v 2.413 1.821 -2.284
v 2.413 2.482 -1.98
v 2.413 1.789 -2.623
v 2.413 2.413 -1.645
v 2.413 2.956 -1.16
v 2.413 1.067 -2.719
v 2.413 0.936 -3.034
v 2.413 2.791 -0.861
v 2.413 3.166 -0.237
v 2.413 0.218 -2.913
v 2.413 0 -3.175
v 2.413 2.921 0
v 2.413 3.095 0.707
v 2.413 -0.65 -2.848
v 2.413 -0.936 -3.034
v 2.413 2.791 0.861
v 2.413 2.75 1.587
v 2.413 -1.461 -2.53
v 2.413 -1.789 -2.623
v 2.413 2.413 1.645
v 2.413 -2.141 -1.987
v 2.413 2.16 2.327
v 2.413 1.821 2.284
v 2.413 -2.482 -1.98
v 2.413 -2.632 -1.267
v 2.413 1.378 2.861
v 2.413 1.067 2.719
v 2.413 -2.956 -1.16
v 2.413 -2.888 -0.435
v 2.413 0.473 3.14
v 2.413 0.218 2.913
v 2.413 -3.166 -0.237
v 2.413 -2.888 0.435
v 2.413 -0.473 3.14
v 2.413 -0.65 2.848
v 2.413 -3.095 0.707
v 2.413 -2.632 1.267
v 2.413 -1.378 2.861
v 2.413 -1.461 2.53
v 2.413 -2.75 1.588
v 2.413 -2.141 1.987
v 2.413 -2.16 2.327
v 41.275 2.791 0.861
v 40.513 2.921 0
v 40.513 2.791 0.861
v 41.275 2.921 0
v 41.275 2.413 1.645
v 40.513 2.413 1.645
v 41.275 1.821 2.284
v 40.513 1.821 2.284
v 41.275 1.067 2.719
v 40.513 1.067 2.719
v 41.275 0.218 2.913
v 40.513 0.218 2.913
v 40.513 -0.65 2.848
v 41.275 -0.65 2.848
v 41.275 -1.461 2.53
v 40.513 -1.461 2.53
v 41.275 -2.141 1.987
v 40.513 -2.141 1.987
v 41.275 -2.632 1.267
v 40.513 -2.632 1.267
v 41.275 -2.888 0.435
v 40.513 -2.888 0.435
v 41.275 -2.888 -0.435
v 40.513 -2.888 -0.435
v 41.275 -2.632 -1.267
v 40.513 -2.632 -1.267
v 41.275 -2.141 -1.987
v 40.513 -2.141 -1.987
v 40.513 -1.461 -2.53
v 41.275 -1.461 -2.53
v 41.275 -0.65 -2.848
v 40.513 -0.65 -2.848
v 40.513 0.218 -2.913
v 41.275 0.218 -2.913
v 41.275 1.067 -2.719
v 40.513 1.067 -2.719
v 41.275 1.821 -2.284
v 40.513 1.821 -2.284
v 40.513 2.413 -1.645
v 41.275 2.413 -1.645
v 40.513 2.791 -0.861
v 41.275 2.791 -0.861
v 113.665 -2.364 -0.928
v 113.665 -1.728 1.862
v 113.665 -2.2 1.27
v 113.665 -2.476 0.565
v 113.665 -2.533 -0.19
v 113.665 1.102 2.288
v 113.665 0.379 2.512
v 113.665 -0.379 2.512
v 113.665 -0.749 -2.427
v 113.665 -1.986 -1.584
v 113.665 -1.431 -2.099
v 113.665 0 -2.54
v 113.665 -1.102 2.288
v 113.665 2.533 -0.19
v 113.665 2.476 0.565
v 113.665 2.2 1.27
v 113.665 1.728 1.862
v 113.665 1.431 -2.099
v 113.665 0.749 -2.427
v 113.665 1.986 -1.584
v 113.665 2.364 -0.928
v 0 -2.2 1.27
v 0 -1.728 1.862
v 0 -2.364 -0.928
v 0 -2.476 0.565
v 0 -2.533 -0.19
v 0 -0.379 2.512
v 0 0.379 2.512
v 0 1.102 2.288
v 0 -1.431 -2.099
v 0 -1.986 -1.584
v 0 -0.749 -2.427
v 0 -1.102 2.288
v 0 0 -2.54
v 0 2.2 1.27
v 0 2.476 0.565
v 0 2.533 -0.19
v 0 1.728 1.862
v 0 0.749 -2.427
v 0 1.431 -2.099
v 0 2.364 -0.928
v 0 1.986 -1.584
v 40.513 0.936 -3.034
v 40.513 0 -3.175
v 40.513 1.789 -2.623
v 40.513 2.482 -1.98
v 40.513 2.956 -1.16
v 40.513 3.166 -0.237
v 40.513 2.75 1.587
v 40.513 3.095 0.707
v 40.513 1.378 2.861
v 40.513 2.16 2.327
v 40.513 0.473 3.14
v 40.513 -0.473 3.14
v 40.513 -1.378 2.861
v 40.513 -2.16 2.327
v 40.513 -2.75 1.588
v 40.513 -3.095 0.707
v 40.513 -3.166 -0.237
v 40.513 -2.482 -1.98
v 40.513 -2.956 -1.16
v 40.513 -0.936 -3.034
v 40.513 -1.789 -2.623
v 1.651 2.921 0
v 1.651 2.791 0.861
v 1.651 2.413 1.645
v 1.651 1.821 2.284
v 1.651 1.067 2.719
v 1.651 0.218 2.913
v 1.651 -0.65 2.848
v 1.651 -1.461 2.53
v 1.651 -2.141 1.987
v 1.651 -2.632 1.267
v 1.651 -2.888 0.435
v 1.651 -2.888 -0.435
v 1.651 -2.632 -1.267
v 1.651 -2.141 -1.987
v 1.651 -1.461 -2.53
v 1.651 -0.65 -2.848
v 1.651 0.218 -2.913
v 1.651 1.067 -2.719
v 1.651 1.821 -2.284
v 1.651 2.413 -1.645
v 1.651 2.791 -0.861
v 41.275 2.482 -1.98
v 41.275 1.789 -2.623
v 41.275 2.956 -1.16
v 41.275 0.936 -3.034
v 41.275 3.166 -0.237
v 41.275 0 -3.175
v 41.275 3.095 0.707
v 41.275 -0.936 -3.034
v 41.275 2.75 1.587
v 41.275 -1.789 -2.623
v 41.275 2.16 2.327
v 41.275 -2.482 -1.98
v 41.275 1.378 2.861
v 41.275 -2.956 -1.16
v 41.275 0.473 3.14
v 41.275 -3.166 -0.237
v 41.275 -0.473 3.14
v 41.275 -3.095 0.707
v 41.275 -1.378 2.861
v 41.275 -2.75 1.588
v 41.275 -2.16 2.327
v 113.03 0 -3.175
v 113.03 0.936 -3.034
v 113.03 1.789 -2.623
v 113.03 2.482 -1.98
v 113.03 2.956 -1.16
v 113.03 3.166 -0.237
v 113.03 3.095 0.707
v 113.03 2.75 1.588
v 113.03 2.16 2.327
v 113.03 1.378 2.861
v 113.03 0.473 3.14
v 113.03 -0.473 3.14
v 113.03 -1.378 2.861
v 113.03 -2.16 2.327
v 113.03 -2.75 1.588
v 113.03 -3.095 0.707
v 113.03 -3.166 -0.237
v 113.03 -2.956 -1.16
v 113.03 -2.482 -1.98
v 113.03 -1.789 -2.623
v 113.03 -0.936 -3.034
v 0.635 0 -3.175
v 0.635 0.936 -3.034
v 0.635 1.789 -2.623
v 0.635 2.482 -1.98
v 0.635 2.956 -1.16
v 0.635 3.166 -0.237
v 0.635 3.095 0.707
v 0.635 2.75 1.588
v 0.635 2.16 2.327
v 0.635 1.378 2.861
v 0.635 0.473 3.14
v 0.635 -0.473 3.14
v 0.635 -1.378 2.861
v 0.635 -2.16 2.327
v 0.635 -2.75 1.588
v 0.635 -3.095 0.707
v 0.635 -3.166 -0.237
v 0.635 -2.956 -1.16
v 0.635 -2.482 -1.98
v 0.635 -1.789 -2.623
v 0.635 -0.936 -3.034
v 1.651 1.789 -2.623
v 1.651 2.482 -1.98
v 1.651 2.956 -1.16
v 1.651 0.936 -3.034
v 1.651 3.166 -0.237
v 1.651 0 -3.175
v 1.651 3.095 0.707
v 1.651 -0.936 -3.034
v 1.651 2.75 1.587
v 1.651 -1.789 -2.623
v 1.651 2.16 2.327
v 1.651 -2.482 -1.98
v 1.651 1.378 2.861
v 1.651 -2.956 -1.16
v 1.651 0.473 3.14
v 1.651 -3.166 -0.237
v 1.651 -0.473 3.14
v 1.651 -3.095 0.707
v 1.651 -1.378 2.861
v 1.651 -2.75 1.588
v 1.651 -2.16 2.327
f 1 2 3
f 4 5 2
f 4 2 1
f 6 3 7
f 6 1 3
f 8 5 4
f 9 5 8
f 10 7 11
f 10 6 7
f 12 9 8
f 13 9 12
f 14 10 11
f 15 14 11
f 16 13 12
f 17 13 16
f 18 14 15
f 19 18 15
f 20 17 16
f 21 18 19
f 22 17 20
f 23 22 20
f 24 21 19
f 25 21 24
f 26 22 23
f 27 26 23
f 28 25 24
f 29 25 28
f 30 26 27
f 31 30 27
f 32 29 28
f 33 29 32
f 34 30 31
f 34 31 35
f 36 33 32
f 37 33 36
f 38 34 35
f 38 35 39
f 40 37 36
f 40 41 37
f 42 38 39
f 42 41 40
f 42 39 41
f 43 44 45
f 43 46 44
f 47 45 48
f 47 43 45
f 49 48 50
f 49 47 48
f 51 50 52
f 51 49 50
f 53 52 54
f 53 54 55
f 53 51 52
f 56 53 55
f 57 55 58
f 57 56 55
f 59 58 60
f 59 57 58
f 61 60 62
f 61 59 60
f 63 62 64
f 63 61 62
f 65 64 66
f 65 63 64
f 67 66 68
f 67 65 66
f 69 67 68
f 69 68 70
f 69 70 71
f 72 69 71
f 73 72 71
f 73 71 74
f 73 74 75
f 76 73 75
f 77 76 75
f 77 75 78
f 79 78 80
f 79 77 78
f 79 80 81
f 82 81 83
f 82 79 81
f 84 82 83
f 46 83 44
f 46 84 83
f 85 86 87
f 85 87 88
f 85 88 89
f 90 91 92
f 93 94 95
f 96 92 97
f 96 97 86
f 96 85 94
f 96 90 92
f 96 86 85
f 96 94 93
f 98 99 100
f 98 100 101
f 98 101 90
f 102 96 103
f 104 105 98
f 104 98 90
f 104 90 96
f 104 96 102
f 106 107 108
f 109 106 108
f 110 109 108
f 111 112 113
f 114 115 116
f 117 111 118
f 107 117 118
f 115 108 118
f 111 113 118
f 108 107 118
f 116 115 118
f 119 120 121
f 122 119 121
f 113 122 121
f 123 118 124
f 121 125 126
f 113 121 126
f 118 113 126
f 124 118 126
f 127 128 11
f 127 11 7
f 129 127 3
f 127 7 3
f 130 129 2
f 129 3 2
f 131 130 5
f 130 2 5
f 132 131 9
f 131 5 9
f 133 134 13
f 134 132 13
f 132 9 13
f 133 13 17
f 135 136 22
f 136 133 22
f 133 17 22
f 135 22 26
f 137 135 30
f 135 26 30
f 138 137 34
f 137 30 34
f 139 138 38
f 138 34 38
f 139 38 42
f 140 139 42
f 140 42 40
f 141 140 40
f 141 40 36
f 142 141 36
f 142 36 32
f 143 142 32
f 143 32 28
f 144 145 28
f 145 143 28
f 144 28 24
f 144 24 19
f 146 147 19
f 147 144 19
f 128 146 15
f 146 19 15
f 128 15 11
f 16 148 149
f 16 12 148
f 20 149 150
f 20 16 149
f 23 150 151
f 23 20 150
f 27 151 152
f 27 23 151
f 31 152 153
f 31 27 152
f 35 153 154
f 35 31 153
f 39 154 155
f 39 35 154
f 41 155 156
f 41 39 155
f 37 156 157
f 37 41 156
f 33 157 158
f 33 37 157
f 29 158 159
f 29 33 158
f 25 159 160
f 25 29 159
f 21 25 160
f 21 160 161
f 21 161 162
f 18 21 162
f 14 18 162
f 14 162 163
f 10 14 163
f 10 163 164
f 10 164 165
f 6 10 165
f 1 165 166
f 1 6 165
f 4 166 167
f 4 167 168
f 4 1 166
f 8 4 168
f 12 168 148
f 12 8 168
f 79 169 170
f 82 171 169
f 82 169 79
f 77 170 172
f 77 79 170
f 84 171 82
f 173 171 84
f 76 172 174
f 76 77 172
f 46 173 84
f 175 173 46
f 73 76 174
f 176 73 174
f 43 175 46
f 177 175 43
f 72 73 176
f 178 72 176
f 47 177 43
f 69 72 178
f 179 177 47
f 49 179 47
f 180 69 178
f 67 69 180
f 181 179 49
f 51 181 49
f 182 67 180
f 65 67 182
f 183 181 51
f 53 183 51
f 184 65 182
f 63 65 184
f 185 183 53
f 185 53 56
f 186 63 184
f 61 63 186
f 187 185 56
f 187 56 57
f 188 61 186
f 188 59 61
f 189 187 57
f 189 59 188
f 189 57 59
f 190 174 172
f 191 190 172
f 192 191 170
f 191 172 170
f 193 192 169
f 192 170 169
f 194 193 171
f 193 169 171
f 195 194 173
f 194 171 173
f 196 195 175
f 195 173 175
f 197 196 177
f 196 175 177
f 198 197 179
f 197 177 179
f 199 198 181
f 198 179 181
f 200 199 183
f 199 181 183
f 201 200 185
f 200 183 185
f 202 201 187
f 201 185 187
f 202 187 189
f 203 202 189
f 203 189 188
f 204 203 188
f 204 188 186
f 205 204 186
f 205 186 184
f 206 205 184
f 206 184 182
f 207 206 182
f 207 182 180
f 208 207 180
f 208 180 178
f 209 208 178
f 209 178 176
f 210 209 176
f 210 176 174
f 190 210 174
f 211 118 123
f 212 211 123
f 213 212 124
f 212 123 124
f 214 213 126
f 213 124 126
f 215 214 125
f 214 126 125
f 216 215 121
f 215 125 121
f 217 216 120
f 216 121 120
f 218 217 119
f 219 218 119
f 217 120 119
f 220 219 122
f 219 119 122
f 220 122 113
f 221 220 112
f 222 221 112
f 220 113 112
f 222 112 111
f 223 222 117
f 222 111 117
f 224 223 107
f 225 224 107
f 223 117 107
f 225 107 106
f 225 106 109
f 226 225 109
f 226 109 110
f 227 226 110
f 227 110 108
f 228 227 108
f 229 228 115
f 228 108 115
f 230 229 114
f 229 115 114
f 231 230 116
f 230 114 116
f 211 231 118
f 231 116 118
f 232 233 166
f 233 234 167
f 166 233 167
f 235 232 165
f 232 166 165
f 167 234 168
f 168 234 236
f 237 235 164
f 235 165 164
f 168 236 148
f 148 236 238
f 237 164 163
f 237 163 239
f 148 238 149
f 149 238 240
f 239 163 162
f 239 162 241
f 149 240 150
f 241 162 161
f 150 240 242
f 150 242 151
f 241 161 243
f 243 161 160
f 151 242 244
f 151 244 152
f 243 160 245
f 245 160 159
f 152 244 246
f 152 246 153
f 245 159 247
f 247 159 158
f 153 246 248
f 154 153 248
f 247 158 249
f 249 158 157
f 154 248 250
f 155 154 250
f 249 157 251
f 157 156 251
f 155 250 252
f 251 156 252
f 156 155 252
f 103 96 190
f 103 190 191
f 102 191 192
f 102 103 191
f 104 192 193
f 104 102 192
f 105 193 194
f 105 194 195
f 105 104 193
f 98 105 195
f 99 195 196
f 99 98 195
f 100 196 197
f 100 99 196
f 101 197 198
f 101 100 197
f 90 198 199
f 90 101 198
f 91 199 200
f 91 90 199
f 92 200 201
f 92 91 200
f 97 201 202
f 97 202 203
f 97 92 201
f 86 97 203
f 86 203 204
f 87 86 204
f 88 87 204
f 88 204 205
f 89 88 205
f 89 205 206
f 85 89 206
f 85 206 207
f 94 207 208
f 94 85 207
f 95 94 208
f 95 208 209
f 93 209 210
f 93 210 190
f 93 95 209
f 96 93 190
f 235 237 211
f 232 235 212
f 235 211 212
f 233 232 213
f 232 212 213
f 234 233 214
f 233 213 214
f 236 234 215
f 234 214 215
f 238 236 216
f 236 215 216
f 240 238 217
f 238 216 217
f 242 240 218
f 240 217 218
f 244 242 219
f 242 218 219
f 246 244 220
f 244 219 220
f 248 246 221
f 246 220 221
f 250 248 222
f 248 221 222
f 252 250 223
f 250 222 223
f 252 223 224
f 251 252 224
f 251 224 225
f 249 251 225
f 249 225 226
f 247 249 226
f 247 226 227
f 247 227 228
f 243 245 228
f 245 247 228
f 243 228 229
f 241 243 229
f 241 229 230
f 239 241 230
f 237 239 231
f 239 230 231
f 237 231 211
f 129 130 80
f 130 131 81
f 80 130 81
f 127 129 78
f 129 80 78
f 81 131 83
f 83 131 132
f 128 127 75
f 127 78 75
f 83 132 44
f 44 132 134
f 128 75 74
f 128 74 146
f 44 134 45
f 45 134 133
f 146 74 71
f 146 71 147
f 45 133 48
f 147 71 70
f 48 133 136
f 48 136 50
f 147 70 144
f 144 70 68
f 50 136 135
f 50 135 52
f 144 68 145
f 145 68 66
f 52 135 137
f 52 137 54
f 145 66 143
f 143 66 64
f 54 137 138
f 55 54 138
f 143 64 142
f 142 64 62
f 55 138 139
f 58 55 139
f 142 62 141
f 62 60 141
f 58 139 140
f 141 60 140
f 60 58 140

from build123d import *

# Parameters (mm, degrees)
SKETCH2_R           = 3.175
BOSS_EXTRUDE1_DEPTH = 113.665
CHAMFER1_SIZE       = 0.635
SKETCH3_W           = 0.762
SKETCH3_H           = 0.254


with BuildPart() as part:
    # Sketch2 → Boss-Extrude1 (new body)
    with BuildSketch(Plane(origin=(0, 0, 0), x_dir=(0, 0, -1), z_dir=(1, 0, 0))):
        Circle(SKETCH2_R)
    extrude(amount=BOSS_EXTRUDE1_DEPTH)

    # Chamfer1
    chamfer1_edges = [part.edges().sort_by_distance(p)[0] for p in [
        (0, 0, 3.175),
        (113.665, 0, 3.175),
    ]]
    chamfer(chamfer1_edges, length=CHAMFER1_SIZE)

    # Sketch3 → Cut-Revolve1 (revolve, cut)
    with BuildSketch(Plane.XY):
        with Locations((2.032, 3.048)):
            Rectangle(SKETCH3_W, SKETCH3_H)
        with Locations((40.894, 3.048)):
            Rectangle(SKETCH3_W, SKETCH3_H)
    revolve(axis=Axis((0, 0, 0), (1, 0, 0)), mode=Mode.SUBTRACT)


solid = part.part
